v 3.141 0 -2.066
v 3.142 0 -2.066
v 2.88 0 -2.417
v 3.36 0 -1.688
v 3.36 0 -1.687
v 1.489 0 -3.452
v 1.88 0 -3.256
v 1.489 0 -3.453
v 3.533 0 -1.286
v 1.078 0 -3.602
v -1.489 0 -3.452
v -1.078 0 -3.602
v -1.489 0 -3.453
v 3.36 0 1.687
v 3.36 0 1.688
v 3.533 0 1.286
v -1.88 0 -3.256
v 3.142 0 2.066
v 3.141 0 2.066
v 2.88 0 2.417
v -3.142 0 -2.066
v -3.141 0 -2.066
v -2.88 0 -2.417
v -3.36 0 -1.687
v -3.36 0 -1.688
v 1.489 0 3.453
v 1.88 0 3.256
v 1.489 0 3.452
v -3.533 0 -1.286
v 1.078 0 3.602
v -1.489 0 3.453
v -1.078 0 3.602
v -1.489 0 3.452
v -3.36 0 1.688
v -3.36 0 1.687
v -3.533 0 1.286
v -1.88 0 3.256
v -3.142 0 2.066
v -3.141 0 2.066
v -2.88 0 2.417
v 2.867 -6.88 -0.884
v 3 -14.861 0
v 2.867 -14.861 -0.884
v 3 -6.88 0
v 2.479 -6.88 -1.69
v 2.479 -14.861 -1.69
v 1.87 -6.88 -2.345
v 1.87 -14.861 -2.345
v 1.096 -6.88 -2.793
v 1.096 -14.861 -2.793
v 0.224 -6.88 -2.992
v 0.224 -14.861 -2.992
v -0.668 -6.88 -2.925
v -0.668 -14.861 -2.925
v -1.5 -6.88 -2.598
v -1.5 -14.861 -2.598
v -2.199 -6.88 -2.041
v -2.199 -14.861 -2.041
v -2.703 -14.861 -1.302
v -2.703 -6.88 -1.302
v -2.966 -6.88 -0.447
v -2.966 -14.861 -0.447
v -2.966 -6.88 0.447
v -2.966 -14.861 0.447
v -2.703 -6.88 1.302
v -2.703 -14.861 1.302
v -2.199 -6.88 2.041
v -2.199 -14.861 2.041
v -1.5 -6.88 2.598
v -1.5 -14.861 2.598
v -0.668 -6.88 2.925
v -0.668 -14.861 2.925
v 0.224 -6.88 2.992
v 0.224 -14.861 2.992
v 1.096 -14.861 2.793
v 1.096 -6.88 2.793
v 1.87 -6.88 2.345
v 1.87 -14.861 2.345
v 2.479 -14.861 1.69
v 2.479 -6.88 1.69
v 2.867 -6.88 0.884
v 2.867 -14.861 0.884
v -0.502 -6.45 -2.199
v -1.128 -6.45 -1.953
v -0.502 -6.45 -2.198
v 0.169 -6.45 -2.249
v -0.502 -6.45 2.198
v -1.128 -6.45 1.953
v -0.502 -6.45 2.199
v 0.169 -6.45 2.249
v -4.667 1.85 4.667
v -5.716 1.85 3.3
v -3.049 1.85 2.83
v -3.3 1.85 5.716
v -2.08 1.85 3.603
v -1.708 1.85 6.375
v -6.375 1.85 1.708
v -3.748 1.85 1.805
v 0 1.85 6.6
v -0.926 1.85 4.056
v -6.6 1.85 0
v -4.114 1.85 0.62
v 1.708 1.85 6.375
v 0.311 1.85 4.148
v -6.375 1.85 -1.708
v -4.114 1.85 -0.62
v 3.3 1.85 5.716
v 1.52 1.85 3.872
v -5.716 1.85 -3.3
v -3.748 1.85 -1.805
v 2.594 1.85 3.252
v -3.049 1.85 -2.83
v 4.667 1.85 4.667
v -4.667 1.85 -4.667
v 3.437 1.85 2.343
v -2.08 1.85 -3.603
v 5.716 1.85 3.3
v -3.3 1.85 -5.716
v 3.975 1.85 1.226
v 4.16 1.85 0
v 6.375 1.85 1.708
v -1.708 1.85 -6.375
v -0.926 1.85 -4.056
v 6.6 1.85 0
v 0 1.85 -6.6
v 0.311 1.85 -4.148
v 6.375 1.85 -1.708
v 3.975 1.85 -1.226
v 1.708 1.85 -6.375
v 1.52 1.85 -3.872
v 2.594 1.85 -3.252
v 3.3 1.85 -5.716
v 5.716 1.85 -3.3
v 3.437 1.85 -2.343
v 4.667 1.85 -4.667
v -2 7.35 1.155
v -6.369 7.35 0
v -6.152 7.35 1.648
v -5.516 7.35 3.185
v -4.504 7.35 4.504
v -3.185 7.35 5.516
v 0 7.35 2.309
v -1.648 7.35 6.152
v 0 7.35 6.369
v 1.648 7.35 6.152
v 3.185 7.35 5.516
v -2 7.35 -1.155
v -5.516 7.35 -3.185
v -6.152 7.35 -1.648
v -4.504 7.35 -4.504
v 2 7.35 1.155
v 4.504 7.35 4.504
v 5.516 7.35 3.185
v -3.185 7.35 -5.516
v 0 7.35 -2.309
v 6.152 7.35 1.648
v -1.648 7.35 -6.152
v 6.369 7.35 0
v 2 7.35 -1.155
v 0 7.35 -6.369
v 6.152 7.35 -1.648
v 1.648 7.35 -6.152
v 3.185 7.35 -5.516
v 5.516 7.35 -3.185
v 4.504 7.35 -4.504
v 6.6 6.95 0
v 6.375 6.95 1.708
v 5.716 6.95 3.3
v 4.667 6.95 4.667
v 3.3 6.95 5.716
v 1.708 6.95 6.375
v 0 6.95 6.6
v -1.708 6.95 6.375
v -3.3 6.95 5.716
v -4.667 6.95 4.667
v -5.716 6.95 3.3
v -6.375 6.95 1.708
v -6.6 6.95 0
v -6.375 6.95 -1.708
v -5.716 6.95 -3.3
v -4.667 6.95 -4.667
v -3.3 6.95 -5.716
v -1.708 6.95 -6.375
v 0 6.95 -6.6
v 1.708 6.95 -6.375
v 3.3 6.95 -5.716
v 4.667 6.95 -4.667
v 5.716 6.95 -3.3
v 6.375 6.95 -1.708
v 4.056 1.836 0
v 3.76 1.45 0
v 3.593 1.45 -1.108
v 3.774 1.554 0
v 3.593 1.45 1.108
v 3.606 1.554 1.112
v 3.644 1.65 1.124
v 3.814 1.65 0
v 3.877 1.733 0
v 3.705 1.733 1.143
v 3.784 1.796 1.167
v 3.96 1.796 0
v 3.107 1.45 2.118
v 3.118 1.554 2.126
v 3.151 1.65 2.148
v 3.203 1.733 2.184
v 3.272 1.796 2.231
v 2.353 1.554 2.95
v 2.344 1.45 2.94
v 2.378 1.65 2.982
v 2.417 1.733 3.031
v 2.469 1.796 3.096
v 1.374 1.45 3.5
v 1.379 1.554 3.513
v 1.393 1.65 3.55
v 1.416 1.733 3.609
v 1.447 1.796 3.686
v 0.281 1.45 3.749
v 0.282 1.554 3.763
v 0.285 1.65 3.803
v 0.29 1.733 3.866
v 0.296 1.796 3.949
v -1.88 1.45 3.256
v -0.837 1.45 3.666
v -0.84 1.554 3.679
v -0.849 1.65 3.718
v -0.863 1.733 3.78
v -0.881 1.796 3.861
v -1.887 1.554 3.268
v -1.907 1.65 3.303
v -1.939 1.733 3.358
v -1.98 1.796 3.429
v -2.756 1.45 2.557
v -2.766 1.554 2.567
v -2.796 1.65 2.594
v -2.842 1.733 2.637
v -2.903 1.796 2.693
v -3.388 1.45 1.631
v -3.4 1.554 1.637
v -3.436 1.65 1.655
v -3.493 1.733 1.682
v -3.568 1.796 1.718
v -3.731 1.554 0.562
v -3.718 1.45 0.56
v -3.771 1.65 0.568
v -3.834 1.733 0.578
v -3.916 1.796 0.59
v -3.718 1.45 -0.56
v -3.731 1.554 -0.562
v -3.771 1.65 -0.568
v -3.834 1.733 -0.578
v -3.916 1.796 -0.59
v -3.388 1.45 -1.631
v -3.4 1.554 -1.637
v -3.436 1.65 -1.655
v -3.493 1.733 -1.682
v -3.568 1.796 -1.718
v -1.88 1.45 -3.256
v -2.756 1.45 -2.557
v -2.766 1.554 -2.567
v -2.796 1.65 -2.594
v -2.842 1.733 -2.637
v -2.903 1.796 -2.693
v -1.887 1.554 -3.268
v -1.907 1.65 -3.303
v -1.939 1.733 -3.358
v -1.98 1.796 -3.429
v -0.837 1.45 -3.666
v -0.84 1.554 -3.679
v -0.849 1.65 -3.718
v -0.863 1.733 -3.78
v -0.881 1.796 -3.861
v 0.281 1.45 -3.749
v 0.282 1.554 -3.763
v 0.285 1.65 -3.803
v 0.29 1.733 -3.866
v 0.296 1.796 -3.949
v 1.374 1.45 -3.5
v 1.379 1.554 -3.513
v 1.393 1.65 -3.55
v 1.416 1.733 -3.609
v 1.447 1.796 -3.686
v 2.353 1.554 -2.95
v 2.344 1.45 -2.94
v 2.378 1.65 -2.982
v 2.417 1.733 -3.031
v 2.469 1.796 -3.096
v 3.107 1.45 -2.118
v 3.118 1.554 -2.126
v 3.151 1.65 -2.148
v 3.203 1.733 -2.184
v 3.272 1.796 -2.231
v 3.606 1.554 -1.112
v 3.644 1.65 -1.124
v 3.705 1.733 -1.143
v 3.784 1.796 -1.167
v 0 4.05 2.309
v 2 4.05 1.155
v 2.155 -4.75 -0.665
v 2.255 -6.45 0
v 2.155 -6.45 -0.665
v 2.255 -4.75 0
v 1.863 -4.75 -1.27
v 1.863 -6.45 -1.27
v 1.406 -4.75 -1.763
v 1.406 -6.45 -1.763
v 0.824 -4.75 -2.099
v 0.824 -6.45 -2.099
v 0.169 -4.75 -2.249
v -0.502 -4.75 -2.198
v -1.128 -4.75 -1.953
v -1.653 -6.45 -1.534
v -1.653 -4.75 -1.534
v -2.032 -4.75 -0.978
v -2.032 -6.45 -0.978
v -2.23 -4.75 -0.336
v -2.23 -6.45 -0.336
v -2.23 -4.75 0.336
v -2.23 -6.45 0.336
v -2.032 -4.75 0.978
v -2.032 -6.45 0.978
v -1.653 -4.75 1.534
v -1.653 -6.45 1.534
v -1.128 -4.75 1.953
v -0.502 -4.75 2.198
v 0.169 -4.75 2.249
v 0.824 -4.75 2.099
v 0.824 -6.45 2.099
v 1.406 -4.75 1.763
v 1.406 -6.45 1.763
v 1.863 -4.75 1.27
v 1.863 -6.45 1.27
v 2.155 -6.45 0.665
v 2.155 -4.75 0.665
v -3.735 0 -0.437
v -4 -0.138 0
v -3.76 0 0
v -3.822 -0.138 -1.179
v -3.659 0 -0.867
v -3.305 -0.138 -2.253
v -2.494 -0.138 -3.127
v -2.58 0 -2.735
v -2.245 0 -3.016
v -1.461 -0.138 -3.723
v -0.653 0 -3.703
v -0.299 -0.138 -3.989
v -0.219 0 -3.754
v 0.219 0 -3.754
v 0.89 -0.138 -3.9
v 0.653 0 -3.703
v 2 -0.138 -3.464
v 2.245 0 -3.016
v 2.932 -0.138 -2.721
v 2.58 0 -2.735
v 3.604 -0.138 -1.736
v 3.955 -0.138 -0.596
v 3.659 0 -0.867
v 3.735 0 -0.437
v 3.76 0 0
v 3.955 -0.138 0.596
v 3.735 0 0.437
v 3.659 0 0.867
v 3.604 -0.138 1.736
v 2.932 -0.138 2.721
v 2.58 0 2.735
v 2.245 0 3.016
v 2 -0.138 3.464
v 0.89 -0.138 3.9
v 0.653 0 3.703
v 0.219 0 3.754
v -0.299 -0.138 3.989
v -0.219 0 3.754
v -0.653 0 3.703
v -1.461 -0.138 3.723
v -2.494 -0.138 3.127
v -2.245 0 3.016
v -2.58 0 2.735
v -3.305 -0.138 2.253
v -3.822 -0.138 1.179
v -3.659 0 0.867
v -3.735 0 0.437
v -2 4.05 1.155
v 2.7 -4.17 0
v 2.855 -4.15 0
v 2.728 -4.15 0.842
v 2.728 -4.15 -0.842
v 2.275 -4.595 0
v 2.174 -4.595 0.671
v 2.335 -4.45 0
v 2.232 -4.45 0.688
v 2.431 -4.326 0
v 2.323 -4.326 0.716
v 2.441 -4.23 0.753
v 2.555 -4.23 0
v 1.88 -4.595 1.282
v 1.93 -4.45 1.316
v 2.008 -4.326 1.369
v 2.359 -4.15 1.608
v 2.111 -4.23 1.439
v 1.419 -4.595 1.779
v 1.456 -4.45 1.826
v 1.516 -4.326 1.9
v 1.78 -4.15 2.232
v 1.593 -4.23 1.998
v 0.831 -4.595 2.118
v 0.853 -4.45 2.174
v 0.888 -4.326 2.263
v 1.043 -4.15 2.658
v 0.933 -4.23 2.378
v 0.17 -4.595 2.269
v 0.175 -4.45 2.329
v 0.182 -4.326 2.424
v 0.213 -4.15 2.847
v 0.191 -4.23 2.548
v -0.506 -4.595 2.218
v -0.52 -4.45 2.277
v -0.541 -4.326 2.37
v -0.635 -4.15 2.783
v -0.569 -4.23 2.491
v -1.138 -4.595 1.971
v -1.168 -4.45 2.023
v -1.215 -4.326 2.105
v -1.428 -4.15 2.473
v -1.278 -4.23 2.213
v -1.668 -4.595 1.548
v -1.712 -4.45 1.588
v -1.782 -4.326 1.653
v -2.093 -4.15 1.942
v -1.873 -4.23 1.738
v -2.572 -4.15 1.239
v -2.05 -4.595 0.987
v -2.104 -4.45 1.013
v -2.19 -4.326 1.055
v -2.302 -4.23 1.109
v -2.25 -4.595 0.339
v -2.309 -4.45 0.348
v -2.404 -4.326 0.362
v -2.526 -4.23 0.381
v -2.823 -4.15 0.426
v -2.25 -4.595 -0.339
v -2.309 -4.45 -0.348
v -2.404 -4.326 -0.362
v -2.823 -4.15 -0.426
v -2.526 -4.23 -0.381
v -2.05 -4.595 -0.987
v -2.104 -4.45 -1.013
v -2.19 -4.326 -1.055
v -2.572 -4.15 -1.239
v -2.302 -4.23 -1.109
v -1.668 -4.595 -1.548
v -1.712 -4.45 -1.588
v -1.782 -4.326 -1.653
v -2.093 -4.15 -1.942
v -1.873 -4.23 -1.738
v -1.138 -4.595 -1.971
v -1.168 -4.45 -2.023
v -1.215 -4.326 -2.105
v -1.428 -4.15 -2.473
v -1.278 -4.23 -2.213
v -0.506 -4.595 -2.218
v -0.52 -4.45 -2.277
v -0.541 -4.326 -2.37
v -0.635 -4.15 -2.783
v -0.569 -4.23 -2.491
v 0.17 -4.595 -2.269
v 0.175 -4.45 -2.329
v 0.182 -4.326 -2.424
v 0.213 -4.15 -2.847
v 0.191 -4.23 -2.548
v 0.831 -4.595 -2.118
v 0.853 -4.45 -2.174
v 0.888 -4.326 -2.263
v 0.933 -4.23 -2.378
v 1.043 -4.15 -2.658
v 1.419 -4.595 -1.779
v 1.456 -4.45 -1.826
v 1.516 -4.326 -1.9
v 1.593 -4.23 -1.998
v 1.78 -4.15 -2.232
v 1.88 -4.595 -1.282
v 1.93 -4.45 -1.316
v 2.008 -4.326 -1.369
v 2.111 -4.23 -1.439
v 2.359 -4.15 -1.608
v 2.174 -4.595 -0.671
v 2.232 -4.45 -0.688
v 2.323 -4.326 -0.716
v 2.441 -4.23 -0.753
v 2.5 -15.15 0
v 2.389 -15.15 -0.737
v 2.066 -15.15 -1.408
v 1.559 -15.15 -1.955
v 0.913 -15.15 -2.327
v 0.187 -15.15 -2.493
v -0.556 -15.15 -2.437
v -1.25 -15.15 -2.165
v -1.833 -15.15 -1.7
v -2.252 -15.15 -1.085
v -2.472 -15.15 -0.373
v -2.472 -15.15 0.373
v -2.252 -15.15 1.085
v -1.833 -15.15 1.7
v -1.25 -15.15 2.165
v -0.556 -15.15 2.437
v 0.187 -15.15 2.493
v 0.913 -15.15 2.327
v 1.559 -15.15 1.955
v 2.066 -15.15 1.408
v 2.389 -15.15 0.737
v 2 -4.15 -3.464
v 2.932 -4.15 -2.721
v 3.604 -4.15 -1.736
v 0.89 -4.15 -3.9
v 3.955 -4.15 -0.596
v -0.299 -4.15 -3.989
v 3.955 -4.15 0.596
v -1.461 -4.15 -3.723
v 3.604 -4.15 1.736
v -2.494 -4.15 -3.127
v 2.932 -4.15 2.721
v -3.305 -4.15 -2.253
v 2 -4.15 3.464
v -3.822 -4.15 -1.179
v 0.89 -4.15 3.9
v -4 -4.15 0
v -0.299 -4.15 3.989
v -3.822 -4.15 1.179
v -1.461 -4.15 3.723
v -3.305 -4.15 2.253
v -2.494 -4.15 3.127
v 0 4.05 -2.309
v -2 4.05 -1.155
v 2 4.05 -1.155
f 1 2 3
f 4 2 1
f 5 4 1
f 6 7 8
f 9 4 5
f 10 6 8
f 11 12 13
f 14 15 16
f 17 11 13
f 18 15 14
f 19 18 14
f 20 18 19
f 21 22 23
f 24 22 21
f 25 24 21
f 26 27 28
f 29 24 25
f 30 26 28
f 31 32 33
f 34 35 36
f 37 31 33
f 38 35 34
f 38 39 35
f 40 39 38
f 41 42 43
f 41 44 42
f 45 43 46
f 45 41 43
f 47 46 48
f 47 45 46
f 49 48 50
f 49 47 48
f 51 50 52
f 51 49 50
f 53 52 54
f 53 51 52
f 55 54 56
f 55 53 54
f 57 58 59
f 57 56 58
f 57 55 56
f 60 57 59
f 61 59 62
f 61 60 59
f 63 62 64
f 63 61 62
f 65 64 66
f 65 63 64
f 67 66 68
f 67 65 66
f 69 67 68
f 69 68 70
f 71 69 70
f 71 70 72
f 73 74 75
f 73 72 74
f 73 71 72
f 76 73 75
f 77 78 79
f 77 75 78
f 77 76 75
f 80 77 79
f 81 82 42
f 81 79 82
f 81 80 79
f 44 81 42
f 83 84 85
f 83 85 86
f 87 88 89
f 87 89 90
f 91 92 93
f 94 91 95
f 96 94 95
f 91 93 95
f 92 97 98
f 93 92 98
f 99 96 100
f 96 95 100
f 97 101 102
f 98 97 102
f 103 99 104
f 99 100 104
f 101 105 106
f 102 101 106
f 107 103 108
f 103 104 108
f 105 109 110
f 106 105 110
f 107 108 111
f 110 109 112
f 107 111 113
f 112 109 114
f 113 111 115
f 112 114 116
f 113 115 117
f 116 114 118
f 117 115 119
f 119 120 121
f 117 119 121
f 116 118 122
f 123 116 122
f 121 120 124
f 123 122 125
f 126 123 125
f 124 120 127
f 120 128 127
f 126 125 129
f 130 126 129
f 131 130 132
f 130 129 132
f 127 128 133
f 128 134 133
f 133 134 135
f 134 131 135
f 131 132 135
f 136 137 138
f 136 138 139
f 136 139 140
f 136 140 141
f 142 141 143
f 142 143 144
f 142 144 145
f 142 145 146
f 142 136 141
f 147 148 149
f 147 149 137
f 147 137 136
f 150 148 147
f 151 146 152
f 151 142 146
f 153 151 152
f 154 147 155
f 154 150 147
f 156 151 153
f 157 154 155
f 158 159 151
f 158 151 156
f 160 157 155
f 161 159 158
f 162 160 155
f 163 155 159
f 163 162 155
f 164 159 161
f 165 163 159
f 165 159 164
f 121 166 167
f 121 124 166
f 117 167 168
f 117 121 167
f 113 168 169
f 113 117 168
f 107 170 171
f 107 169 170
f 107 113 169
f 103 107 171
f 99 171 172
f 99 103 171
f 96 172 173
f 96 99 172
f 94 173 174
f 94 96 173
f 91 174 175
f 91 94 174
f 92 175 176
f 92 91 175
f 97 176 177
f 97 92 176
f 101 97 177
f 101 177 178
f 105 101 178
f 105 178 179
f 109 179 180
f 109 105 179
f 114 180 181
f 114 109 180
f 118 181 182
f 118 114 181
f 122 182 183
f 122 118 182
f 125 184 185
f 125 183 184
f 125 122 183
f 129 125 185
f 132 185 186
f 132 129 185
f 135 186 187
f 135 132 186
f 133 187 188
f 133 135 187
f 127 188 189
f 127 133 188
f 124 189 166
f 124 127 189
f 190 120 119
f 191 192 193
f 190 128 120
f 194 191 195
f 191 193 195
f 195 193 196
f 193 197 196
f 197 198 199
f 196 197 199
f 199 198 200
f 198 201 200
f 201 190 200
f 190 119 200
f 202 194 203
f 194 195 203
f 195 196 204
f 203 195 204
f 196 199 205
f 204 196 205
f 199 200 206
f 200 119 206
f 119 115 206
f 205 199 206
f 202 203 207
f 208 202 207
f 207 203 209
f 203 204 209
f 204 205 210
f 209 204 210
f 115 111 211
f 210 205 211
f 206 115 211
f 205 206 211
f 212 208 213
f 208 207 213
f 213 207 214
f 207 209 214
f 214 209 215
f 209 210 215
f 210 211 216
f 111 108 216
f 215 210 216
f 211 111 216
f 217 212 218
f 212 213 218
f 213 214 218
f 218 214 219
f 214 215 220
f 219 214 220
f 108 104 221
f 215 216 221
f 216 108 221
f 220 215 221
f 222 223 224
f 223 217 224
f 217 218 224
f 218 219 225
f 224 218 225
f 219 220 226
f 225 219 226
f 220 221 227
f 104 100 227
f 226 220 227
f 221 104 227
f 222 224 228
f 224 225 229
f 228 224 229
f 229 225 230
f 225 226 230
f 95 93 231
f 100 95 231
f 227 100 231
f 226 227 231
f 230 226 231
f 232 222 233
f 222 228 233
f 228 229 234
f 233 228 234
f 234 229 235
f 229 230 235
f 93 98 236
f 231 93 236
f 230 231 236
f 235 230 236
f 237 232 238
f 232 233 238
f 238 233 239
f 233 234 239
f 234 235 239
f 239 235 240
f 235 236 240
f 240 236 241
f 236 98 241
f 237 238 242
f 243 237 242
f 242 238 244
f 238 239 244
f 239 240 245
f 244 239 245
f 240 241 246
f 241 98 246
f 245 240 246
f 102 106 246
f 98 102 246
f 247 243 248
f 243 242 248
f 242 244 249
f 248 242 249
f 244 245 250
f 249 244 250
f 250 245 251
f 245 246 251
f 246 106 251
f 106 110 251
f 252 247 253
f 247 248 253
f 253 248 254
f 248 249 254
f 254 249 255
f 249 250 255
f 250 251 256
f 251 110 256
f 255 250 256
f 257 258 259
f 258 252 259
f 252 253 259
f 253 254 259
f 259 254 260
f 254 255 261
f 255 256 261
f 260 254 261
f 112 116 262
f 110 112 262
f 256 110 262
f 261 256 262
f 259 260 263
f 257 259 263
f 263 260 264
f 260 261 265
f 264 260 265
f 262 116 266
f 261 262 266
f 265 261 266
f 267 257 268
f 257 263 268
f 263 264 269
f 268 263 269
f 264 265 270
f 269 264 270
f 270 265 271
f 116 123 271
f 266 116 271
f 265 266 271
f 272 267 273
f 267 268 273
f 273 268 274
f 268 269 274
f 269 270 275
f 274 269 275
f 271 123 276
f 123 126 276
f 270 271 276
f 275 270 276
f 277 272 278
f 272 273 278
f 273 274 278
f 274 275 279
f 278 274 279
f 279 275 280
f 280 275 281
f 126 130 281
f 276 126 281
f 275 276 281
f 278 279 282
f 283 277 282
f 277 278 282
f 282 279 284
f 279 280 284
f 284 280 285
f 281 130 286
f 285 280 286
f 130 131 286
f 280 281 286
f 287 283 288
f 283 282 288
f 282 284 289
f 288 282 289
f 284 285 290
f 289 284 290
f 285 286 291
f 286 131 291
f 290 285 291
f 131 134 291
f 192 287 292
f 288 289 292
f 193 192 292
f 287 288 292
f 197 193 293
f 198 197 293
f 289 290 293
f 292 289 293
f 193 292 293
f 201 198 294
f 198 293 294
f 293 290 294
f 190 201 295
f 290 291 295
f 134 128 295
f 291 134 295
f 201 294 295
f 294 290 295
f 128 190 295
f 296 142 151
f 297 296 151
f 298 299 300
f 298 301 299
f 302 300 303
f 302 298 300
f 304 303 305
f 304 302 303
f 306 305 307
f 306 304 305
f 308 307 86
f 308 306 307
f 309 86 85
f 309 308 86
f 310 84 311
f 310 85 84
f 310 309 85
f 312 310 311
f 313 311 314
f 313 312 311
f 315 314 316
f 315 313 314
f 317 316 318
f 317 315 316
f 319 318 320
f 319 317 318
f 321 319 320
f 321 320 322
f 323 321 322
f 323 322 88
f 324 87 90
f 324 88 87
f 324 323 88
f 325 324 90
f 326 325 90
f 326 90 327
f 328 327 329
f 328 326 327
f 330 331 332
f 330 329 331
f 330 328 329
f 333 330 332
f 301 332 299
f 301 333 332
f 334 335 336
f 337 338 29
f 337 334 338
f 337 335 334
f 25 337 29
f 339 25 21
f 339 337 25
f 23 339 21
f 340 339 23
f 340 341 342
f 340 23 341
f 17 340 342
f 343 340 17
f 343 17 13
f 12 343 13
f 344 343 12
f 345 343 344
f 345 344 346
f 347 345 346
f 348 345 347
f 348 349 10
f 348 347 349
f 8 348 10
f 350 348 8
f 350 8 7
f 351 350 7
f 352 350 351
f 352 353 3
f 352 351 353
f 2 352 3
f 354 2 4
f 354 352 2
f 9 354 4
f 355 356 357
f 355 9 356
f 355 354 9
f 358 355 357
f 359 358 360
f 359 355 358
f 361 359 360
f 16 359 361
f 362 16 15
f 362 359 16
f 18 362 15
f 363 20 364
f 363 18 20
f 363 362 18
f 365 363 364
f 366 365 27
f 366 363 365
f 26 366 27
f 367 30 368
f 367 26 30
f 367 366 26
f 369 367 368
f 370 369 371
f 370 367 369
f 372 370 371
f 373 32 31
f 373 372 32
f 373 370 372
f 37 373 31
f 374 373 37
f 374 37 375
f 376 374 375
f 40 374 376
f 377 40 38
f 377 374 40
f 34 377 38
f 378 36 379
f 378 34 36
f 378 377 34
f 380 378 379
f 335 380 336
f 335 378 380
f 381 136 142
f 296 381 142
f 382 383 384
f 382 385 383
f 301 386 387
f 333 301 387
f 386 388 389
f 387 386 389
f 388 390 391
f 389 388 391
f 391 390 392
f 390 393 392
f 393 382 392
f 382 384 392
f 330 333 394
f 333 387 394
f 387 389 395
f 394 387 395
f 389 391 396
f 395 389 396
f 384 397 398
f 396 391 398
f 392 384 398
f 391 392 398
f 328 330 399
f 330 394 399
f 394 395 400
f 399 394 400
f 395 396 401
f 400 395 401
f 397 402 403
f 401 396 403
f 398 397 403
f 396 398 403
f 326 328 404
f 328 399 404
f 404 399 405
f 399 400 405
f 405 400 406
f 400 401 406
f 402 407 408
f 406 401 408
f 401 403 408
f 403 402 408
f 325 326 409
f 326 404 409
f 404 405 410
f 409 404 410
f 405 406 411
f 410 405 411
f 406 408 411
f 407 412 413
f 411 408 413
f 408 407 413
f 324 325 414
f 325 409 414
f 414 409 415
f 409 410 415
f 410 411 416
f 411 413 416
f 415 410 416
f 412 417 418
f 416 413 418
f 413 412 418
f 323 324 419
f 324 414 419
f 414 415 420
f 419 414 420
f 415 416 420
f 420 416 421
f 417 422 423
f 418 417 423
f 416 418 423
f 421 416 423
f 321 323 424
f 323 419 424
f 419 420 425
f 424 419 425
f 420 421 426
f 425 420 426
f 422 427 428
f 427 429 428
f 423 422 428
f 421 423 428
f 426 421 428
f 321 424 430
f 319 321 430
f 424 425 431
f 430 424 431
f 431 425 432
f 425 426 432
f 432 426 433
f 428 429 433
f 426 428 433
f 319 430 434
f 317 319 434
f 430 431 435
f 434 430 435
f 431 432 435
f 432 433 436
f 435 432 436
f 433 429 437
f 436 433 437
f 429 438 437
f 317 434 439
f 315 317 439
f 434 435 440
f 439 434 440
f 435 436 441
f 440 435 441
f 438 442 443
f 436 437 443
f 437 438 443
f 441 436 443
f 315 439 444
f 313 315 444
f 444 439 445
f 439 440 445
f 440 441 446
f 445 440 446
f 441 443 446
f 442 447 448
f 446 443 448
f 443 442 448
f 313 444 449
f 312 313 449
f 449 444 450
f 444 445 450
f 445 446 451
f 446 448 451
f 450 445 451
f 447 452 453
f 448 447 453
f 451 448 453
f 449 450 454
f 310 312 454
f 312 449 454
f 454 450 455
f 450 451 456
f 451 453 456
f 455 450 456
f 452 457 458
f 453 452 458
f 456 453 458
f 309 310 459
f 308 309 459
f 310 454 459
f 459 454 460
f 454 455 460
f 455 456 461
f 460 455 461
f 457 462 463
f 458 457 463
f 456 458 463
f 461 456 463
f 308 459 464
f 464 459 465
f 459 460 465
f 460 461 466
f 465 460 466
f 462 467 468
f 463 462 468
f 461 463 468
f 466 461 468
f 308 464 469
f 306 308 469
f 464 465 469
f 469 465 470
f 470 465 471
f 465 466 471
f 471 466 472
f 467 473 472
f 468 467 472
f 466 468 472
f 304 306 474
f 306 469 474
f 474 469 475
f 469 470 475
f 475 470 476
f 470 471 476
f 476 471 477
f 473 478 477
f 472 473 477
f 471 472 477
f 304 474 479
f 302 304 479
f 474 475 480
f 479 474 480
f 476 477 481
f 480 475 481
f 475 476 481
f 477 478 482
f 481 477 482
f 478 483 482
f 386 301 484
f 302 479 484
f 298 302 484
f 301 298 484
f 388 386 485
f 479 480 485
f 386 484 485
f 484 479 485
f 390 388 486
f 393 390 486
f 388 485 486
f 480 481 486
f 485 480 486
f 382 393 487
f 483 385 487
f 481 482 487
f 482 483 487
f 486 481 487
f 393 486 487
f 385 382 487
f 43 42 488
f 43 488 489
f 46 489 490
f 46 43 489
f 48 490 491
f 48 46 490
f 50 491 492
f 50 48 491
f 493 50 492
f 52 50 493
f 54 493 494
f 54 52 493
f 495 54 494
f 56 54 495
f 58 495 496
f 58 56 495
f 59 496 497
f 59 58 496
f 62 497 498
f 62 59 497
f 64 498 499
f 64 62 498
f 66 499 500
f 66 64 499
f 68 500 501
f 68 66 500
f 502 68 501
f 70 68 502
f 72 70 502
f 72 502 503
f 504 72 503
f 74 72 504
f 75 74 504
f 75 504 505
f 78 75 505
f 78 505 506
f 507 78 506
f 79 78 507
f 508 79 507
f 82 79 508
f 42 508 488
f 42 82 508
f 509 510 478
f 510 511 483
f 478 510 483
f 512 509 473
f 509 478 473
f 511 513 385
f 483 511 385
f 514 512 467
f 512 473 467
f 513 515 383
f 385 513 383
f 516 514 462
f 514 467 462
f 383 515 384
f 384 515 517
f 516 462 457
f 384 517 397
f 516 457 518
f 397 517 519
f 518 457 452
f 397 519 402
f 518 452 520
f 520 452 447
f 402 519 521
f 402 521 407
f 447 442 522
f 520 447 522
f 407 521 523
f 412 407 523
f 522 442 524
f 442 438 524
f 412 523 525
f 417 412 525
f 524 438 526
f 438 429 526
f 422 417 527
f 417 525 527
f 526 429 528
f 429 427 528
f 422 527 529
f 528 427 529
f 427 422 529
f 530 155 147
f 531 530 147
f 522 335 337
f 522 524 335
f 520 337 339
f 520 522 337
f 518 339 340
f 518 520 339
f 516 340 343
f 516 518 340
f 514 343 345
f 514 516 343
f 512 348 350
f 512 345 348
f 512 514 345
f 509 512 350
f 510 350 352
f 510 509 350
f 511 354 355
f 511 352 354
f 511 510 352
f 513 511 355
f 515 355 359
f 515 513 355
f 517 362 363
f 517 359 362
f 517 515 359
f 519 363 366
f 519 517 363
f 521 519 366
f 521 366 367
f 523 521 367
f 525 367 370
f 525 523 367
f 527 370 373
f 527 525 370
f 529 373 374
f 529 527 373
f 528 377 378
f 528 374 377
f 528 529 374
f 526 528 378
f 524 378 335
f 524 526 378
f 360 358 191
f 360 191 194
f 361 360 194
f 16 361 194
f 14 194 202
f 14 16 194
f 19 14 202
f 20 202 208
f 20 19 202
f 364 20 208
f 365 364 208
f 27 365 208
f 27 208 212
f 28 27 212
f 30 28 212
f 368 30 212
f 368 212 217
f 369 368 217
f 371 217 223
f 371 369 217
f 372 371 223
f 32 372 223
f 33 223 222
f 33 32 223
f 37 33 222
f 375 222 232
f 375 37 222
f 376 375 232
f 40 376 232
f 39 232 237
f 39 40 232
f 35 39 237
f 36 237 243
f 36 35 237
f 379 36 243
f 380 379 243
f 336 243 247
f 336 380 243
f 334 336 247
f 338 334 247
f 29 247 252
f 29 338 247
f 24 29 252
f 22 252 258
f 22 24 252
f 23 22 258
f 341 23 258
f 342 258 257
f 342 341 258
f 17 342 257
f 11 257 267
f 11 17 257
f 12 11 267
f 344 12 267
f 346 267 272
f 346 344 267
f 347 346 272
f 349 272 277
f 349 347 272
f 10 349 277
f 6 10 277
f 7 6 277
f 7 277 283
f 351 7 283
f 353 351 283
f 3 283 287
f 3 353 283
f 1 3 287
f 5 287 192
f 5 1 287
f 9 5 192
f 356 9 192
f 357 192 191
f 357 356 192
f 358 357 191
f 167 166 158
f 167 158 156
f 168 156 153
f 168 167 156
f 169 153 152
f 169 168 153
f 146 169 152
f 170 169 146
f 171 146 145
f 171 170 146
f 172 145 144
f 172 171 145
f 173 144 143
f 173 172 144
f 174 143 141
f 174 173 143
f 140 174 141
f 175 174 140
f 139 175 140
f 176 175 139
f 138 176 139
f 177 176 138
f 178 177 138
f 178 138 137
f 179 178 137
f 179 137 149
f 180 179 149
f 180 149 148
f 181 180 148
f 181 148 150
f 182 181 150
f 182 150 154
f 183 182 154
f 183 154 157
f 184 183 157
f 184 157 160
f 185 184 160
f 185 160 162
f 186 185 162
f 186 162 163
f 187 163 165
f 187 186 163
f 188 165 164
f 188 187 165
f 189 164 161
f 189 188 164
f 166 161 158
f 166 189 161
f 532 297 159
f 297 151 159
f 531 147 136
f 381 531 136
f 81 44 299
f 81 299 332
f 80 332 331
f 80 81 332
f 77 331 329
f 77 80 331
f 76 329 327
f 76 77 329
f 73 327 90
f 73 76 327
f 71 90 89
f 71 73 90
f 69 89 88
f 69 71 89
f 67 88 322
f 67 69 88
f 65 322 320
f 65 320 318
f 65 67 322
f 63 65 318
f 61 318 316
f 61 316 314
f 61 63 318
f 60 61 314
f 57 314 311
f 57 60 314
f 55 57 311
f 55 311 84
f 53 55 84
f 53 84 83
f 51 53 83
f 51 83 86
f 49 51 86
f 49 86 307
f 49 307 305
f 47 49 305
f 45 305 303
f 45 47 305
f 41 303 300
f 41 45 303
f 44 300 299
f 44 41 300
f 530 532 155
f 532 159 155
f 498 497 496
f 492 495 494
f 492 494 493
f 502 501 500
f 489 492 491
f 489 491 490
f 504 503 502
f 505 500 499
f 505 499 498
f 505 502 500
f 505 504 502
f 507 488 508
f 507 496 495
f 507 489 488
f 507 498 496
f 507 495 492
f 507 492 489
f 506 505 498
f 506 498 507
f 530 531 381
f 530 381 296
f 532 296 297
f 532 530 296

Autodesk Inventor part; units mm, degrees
ref_plane "YZ Plane" through (0, 0, 0) normal (1, 0, 0) x (0, 1, 0)
ref_plane "XZ Plane" through (0, 0, 0) normal (0, 1, 0) x (-1, 0, 0)
ref_plane "XY Plane" through (0, 0, 0) normal (0, 0, 1) x (1, 0, 0)
sketch "Sketch1" plane through (0, 0, 0) normal (0, 0, 1) x (1, 0, 0)
  line L0 (0, 0) -> (-4, 0)
  line L1 (-4, 0) -> (-4, -4.15)
  line L2 (-4, -4.15) -> (0, -4.15)
  line L3 (0, -4.15) -> (0, 0)
  line L4 (0, 0) -> (-13.1356, 0) construction
  dimension "d1" = 4.15
  dimension "d2" = 4
revolve "Shoulder" add sketch "Sketch1" angle 360 about axis through (0, -4.15, 0) along (0, 1, 0)
sketch "Sketch2" plane through (0, 0, 0) normal (0, 1, 0) x (1, 0, 0)
  circle A0 centre (0, 0) radius 4 projected
  circle A1 centre (0, 0) radius 3.76
  dimension "d3" = 7.52
extrude "Shoulder_neck" add sketch "Sketch2" along normal blind 1.85 contours A1
sketch "Sketch3" plane through (0, 1.85, 0) normal (0, 1, 0) x (1, 0, 0)
  circle A0 centre (0, 0) radius 3.76 projected
  circle A1 centre (0, 0) radius 6.6
  dimension "d6" = 13.2
extrude "Head" add sketch "Sketch3" along normal blind 5.5 contours A0 | A1
sketch "Sketch4" plane through (0, -4.15, 0) normal (0, -1, 0) x (1, 0, 0)
  circle A0 centre (0, 0) radius 4 projected
  circle A1 centre (0, 0) radius 2.255
  dimension "d9" = 4.51
extrude "Thread_neck" add sketch "Sketch4" along normal blind 2.3 contours A1
sketch "Sketch5" plane through (0, -6.45, 0) normal (0, -1, 0) x (1, 0, 0)
  circle A0 centre (0, 0) radius 2.255 projected
  circle A1 centre (0, 0) radius 3
  dimension "d12" = 6
extrude "Thread_shoulder" add sketch "Sketch5" along normal blind 8.7 contours A0 | A1
sketch "Sketch6" plane through (0, 7.35, 0) normal (0, 1, 0) x (1, 0, 0)
  circle A0 centre (0, 0) radius 6.6 projected
  circle A1 centre (0, 0) radius 2 construction
  line L0 (-2, 1.1547) -> (-2, -1.1547)
  line L1 (-2, -1.1547) -> (0, -2.3094)
  line L2 (0, -2.3094) -> (2, -1.1547)
  line L3 (2, -1.1547) -> (2, 1.1547)
  line L4 (2, 1.1547) -> (0, 2.3094)
  line L5 (0, 2.3094) -> (-2, 1.1547)
  dimension "d15" = 4
extrude "Hex" cut sketch "Sketch6" against normal blind 3.3 contours L5 L4 L3 L2 L1 L0
chamfer "Chamfer1" distance 0.24 angle 30 1 edges at (4, 0, 0) measured on face at (-3.8813, 0, -0.3191)
fillet "Fillet1" radius 0.4 1 edges at (-3.76, 1.85, 0)
chamfer "Chamfer2" distance 0.4 angle 30 1 edges at (-6.6, 7.35, 0) measured on face at (6.5145, 5.5167, 1.0587)
chamfer "Chamfer3" distance 0.5 angle 30 1 edges at (-3, -15.15, 0) measured on face at (-0.5351, -15.15, 1.0949)
fillet "Fillet2" radius 0.6 1 edges at (-2.255, -4.15, 0)
chamfer "Chamfer7" distance 0.745 angle 30 1 edges at (-3, -6.45, 0) measured on face at (2.7008, -6.45, -0.4192)
thread "Thread" size "M6x1" class "6g" standard "ANSI Metric M Profile" full length
equation "\"d3\" = Shoulder_neck_dia"
equation "\"d4\" = Shoulder_neck_length"
equation "\"d6\" = Head_diameter"
equation "\"d7\" = Head_height"
equation "\"d9\" = Thread_neck_dia"
equation "\"d10\" = Thread_neck_length"
equation "\"d12\" = Thread_diameter"
equation "\"d13\" = Thread_length - Thread_neck_length"
equation "\"d15\" = Hex_size"
equation "\"d16\" = Hex_length"
equation "\"d18\" = -0.5 * Shoulder_neck_dia + 0.5 * Shoulder_diameter"
equation "\"d64\" = -0.5 * Shoulder_neck_dia + 0.5 * Shoulder_diameter"
equation "\"d21\" = 0.1 * Hex_size"
equation "\"d65\" = 0.1 * Hex_size"
equation "\"d23\" = 0.5 * Thread_pitch"
equation "\"d66\" = 0.5 * Thread_pitch"
equation "\"d25\" = Thread_neck_radius"
equation "\"d60\" = -0.5 * Thread_neck_dia + 0.5 * Thread_diameter"
equation "\"d67\" = -0.5 * Thread_neck_dia + 0.5 * Thread_diameter"
equation "\"d1\" = Shoulder_length - Shoulder_neck_length"
equation "\"d2\" = 0.5 * Shoulder_diameter"
equation "\"Shoulder_diameter\" = 8"
equation "\"Shoulder_length\" = 6"
equation "\"Shoulder_neck_dia\" = 7.52"
equation "\"Thread_diameter\" = 6"
equation "\"Thread_length\" = 11"
equation "\"Head_diameter\" = 13.2"
equation "\"Head_height\" = 5.5"
equation "\"Thread_neck_dia\" = 4.51"
equation "\"Hex_size\" = 4"
equation "\"Hex_length\" = 3.3"
equation "\"Thread_pitch\" = 1"
equation "\"Shoulder_neck_length\" = 1.85"
equation "\"Thread_neck_length\" = 2.3"
equation "\"Thread_neck_radius\" = 0.6"
properties part number "SCREW,SHOULDER,M8X6MM" material "Steel, High Strength Low Alloy"
